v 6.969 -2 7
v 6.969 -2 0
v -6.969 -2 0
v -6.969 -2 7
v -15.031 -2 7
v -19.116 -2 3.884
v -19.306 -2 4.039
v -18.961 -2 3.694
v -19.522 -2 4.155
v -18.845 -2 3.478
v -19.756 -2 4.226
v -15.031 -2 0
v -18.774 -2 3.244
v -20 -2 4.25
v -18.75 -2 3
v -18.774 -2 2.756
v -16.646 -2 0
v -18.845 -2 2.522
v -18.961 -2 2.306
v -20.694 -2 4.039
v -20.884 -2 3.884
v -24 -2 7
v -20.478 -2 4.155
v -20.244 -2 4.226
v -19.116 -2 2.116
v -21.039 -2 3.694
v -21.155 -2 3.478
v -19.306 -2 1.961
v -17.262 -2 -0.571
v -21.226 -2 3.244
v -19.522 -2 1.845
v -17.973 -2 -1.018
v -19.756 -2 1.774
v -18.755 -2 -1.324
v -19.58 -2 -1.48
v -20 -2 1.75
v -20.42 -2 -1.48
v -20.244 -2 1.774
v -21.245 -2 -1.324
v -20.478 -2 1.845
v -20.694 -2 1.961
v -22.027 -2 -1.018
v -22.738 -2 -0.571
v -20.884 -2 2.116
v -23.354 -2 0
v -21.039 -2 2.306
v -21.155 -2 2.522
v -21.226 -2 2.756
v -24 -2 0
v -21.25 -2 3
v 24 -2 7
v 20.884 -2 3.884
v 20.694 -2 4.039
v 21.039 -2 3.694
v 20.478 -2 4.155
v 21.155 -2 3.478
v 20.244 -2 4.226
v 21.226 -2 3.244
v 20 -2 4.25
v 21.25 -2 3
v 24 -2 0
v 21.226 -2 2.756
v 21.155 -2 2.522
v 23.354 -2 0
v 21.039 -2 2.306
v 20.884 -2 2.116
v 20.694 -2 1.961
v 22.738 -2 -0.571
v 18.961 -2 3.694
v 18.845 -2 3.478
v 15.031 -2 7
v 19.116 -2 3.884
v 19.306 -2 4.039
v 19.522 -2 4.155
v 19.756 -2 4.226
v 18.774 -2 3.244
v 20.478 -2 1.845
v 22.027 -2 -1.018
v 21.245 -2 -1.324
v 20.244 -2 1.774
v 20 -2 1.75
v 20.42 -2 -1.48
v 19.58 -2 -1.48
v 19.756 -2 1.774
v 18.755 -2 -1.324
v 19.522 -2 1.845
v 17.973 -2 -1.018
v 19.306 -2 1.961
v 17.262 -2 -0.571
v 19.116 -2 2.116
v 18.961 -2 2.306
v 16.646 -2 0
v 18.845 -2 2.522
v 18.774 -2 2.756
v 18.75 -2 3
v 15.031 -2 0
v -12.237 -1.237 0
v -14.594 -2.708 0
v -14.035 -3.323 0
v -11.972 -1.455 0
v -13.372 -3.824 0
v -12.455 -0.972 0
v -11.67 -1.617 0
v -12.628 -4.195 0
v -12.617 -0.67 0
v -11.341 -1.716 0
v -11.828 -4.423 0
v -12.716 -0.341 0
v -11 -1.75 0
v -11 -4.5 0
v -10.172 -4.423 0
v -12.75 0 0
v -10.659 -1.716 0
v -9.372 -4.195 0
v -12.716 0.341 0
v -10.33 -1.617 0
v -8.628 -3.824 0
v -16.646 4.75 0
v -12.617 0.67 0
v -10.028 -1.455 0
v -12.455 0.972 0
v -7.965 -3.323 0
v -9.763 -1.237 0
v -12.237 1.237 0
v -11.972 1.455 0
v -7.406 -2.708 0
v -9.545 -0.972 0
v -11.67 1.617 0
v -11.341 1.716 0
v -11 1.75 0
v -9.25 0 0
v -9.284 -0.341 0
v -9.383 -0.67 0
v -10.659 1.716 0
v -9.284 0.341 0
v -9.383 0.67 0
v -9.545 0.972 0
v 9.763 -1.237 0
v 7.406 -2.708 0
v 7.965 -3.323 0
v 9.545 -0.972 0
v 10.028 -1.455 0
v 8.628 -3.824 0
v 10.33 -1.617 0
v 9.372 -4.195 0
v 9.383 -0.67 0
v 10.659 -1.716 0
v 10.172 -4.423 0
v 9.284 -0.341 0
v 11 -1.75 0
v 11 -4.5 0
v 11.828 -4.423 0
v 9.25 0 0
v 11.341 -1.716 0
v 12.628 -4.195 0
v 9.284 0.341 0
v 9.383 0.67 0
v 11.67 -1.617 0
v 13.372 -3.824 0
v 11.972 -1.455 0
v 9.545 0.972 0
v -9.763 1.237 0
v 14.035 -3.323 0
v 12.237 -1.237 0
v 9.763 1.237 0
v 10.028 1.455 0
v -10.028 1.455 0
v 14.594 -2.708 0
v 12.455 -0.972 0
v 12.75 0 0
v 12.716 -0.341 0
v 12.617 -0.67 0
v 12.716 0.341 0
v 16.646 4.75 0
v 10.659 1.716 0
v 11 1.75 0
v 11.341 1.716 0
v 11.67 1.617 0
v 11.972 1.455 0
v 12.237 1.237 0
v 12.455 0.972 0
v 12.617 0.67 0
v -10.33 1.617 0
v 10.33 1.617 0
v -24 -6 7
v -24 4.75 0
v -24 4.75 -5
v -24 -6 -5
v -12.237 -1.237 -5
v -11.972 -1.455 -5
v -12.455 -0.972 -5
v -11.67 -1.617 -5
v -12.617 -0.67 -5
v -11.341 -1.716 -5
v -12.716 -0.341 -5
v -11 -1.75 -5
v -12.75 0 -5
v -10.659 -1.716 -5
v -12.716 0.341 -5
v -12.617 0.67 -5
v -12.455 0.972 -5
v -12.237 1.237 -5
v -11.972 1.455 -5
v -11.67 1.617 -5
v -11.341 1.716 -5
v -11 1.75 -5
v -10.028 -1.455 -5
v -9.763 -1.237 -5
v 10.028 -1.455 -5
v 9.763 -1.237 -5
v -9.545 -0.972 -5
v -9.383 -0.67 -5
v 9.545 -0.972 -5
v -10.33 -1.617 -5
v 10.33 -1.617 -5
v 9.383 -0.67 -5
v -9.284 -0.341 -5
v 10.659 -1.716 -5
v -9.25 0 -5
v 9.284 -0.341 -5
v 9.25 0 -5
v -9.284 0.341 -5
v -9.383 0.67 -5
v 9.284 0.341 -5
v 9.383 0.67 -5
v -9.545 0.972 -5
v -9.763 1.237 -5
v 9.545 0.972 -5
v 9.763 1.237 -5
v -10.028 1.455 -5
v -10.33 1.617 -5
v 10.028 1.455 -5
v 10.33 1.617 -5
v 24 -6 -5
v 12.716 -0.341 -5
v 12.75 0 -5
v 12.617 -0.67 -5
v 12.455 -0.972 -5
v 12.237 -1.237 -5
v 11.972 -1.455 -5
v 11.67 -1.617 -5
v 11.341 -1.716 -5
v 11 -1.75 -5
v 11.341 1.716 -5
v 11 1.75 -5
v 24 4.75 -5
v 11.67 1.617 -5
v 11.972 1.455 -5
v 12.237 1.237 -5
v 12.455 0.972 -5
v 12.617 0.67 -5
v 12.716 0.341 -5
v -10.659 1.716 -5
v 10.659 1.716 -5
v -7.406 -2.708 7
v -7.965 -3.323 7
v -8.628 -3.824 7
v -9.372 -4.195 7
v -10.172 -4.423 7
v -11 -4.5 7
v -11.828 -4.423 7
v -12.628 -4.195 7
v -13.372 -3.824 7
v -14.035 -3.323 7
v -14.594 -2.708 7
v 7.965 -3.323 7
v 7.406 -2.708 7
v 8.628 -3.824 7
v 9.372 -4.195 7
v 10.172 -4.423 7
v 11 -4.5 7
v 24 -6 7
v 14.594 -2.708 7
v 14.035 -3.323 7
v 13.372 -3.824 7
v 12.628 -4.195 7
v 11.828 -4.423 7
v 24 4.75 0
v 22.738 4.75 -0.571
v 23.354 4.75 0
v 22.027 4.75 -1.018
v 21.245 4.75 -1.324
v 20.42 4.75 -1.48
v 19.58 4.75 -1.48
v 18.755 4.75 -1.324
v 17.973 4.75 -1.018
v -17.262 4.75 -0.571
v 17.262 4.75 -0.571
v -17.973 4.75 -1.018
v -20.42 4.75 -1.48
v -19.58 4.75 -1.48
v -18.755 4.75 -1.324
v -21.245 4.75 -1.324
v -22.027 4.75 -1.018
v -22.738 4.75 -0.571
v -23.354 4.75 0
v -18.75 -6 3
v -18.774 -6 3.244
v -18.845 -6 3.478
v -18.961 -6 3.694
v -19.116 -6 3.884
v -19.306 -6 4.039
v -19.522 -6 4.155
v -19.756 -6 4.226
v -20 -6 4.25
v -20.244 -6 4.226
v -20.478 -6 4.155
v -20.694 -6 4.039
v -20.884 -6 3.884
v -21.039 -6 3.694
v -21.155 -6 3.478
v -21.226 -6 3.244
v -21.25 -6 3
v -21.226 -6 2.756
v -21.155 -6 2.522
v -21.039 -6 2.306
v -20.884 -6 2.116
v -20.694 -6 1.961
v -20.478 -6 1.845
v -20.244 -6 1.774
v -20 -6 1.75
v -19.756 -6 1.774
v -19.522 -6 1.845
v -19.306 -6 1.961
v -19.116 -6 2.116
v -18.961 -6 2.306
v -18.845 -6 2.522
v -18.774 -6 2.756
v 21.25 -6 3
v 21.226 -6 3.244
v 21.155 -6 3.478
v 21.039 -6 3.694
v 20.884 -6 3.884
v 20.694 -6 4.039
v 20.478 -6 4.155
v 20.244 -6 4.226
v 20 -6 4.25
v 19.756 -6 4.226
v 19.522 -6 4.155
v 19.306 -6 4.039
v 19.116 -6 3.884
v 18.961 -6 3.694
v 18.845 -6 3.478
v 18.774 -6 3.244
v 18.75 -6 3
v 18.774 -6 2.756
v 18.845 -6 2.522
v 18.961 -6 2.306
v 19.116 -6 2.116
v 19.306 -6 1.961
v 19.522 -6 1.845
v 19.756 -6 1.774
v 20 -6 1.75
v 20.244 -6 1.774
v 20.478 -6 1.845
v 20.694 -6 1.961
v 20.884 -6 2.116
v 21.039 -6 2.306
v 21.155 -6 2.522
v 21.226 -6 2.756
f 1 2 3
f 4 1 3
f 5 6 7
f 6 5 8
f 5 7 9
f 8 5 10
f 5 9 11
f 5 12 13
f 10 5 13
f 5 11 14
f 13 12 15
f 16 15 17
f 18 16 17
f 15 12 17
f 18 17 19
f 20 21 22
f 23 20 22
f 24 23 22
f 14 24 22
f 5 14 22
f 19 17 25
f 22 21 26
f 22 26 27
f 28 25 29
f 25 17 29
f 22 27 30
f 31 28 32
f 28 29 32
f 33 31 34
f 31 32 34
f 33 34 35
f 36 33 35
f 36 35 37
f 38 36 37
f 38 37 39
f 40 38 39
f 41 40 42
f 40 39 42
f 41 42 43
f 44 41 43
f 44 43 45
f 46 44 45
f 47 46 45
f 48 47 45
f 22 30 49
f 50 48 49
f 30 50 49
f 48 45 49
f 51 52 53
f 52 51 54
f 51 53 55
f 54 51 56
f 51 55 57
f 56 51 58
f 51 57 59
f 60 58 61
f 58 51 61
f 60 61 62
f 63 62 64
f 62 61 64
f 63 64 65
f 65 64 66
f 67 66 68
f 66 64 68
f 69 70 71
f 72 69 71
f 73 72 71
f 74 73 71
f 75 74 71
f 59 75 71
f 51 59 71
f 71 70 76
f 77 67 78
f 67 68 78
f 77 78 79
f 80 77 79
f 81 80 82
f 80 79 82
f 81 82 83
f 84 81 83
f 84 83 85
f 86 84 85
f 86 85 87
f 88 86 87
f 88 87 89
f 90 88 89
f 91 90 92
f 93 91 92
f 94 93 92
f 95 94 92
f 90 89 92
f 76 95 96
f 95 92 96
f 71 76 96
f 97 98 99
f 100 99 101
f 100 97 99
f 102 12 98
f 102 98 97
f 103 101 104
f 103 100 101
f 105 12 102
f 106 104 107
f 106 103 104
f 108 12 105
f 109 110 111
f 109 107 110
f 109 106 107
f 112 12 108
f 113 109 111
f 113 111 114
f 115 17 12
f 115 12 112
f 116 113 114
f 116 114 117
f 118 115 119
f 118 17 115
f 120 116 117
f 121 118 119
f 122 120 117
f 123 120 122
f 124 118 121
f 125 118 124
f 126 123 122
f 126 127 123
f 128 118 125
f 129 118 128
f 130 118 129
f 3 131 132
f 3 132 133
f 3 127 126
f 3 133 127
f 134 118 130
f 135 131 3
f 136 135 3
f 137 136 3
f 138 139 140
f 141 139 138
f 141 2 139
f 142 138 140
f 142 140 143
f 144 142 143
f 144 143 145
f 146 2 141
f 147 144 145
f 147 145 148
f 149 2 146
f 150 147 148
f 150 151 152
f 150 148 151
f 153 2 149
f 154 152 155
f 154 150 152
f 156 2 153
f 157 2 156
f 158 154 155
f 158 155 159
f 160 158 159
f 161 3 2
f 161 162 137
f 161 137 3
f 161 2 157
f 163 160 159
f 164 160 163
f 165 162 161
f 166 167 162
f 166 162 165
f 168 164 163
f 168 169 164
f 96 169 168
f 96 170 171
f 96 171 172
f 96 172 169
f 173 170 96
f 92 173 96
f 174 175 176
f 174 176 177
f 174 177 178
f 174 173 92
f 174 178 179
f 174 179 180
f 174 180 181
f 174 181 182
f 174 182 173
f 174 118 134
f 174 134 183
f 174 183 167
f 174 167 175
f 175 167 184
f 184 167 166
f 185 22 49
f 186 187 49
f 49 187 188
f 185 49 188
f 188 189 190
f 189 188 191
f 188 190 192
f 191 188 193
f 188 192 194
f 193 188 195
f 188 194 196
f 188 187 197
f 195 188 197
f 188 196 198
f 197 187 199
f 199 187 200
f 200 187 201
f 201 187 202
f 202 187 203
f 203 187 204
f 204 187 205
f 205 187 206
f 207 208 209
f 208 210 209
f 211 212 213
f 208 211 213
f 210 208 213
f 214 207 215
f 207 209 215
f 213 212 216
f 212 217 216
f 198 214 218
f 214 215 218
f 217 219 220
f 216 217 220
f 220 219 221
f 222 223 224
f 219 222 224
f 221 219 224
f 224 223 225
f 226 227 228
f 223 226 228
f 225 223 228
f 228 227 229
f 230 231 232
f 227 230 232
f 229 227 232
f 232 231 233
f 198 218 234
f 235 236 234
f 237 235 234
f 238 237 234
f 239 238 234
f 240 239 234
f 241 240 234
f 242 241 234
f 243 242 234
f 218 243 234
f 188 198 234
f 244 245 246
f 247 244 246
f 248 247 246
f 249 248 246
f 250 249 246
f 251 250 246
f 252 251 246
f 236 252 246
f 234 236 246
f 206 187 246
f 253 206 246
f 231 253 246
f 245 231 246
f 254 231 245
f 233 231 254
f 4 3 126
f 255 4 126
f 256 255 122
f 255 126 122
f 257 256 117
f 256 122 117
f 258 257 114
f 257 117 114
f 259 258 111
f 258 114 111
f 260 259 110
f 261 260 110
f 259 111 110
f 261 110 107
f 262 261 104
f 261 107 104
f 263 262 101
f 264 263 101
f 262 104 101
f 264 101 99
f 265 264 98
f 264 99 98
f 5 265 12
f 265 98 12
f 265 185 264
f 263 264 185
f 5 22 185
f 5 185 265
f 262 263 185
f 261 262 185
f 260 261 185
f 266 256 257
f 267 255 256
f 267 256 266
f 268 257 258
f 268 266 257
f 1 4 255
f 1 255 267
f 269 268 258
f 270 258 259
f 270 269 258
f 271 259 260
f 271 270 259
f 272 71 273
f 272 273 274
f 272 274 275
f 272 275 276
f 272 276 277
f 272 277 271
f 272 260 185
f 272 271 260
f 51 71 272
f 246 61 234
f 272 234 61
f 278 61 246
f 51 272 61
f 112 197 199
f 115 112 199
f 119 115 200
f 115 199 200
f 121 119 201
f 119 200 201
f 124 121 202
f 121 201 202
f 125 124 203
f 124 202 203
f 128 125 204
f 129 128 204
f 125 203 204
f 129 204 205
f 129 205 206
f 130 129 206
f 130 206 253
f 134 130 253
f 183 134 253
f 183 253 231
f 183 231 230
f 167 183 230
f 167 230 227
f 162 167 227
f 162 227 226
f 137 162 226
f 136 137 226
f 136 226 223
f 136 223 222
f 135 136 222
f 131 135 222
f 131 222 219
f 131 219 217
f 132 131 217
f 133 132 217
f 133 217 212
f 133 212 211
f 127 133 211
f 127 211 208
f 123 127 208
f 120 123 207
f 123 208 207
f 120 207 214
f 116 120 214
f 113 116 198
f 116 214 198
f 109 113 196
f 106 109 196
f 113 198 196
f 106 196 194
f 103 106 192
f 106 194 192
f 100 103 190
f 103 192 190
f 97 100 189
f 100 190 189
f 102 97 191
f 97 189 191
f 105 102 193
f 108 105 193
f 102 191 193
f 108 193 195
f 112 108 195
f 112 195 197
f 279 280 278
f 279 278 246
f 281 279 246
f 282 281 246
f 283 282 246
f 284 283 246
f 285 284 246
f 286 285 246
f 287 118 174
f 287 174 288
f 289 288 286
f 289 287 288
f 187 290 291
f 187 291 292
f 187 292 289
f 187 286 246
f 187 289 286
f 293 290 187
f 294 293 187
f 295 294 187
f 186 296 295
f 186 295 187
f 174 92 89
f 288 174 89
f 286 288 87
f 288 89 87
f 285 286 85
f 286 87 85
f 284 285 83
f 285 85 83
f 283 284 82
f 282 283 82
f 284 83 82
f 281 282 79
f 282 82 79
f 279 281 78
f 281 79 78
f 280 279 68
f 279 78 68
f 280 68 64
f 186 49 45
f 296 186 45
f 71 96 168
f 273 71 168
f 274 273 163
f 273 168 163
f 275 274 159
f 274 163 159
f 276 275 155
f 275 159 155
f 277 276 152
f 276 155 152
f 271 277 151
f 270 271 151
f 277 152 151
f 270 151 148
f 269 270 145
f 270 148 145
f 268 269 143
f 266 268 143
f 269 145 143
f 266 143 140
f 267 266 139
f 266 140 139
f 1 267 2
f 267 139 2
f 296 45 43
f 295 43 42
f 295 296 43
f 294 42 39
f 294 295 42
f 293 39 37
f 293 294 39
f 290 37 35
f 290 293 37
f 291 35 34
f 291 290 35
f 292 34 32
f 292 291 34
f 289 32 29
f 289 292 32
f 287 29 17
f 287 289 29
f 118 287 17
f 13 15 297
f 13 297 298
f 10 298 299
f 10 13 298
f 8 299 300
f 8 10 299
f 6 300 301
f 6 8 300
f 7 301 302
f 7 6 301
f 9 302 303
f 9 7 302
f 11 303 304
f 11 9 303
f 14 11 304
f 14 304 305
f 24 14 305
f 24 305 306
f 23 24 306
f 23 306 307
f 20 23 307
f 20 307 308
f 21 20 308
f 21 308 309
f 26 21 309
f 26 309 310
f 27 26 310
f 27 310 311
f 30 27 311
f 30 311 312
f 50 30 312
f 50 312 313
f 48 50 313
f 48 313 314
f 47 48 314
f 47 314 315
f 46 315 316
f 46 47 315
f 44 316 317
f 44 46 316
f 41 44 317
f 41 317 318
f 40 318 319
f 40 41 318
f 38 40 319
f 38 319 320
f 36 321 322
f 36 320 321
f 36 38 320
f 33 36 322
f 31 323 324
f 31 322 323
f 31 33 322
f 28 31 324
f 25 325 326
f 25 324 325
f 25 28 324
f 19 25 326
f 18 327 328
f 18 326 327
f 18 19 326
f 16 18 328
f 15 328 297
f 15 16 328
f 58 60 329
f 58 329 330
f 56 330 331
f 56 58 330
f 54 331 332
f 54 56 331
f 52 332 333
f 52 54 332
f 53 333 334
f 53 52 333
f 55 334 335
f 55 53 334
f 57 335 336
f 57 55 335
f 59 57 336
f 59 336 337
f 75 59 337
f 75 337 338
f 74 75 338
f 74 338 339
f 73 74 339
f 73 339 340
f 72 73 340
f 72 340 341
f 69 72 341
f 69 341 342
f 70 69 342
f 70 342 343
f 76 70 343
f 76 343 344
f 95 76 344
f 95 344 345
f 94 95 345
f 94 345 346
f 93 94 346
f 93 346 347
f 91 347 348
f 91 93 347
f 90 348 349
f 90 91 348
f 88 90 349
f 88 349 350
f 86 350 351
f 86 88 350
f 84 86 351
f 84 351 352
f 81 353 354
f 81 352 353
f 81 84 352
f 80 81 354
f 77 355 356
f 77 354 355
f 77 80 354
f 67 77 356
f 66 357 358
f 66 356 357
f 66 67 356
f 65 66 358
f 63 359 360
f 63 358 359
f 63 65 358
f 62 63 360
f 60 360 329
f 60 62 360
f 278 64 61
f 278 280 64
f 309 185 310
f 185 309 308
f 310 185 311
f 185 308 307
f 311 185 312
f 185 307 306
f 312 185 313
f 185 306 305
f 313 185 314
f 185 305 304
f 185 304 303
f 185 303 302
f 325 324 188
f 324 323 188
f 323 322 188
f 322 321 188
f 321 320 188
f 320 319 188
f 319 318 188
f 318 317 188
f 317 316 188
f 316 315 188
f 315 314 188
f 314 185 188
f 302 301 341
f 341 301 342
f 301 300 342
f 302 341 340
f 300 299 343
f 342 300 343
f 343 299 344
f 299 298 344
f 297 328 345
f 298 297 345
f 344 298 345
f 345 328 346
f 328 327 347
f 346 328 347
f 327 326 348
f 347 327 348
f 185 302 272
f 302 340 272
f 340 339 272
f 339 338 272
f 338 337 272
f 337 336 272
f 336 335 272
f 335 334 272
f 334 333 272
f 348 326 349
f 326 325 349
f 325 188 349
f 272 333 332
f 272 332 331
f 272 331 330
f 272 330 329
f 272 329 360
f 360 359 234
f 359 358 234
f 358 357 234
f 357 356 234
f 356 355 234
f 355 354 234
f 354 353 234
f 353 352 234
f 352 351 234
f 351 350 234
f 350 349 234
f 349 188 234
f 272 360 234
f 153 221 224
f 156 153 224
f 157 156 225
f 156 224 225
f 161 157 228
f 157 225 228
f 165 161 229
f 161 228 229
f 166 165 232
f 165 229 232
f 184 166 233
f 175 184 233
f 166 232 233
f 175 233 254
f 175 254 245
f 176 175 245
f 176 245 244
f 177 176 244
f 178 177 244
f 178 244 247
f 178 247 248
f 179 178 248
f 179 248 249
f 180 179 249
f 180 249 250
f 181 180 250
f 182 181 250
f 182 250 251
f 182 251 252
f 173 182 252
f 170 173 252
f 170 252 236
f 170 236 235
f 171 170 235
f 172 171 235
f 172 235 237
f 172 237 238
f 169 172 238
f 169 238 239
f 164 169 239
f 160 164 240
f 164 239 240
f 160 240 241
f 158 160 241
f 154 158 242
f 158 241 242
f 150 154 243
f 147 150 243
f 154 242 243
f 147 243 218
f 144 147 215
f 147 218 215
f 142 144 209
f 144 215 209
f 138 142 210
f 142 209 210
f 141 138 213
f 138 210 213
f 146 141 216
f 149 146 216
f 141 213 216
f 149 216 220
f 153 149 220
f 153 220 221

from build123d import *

# Parameters (mm, degrees)
F2_DEPTH      = 5
F3_DEPTH      = 7
F4_D          = 3.5
F4_DEPTH      = 10
F4_TIP        = 1.0515060833
F5_R          = 4.5
F5_R_2        = 1.25
F6_DEPTH      = 6.4
F6_DEPTH_BACK = 2
F7_DEPTH      = 25


with BuildPart() as f2:
    # F1 (on Top) → F2 (new body)
    with BuildSketch(Plane.XY):
        with BuildLine():
            Line((24, 4.75), (-24, 4.75))
            Line((-24, 4.75), (-24, -2))
            Line((-24, -2), (-15.0311288741, -2))
            ThreePointArc((-15.0311288741, -2), (-12.0271124735, 4.3812144397), (-6.5, 0))
            ThreePointArc((-6.5, 0), (-6.6187855603, -1.0271124735), (-6.9688711259, -2))
            Line((-6.9688711259, -2), (6.9688711259, -2))
            ThreePointArc((6.9688711259, -2), (9.9728875265, 4.3812144397), (15.5, 0))
            ThreePointArc((15.5, 0), (15.3812144397, -1.0271124735), (15.0311288741, -2))
            Line((15.0311288741, -2), (24, -2))
            Line((24, -2), (24, 4.75))
        make_face()
        with BuildLine():
            ThreePointArc((-6.5, 0), (-12.0271124735, 4.3812144397), (-15.0311288741, -2))
            Line((-15.0311288741, -2), (-6.9688711259, -2))
            ThreePointArc((-6.9688711259, -2), (-6.6187855603, -1.0271124735), (-6.5, 0))
        make_face()
        with BuildLine():
            Line((-15.0311288741, -2), (-24, -2))
            Line((-24, -2), (-24, -6))
            Line((-24, -6), (24, -6))
            Line((24, -6), (24, -2))
            Line((24, -2), (15.0311288741, -2))
            ThreePointArc((15.0311288741, -2), (11, -4.5), (6.9688711259, -2))
            Line((6.9688711259, -2), (-6.9688711259, -2))
            ThreePointArc((-6.9688711259, -2), (-11, -4.5), (-15.0311288741, -2))
        make_face()
        with BuildLine():
            Line((-6.9688711259, -2), (-15.0311288741, -2))
            ThreePointArc((-15.0311288741, -2), (-11, -4.5), (-6.9688711259, -2))
        make_face()
        with BuildLine():
            ThreePointArc((6.9688711259, -2), (11, -4.5), (15.0311288741, -2))
            Line((15.0311288741, -2), (6.9688711259, -2))
        make_face()
        with BuildLine():
            Line((6.9688711259, -2), (15.0311288741, -2))
            ThreePointArc((15.0311288741, -2), (15.3812144397, -1.0271124735), (15.5, 0))
            ThreePointArc((15.5, 0), (9.9728875265, 4.3812144397), (6.9688711259, -2))
        make_face()
    extrude(amount=-F2_DEPTH)

    # F1 (on Top) → F3 (join)
    with BuildSketch(Plane.XY):
        with BuildLine():
            Line((-15.0311288741, -2), (-24, -2))
            Line((-24, -2), (-24, -6))
            Line((-24, -6), (24, -6))
            Line((24, -6), (24, -2))
            Line((24, -2), (15.0311288741, -2))
            ThreePointArc((15.0311288741, -2), (11, -4.5), (6.9688711259, -2))
            Line((6.9688711259, -2), (-6.9688711259, -2))
            ThreePointArc((-6.9688711259, -2), (-11, -4.5), (-15.0311288741, -2))
        make_face()
    extrude(amount=F3_DEPTH)

    # F4
    with Locations(Plane.XY):
        with Locations((-11, 0), (11, 0)):
            Hole(F4_D / 2, depth=F4_DEPTH)
            with Locations((0, 0, -(F4_DEPTH + F4_TIP / 2))):  # 118° drill point
                Cone(0, F4_D / 2, F4_TIP, mode=Mode.SUBTRACT)

    # F5 (on Front) → F6 (cut, two sides)
    with BuildSketch(Plane.XZ) as f6_sk:
        with Locations((20, 3)):
            Circle(F5_R)
        with Locations((20, 3)):
            Circle(F5_R_2, mode=Mode.SUBTRACT)
        with Locations((-20, 3)):
            Circle(F5_R)
        with Locations((-20, 3)):
            Circle(F5_R_2, mode=Mode.SUBTRACT)
    extrude(amount=-F6_DEPTH, mode=Mode.SUBTRACT)
    extrude(f6_sk.sketch, amount=F6_DEPTH_BACK, mode=Mode.SUBTRACT)

    # F5 (on Front) → F7 (cut)
    with BuildSketch(Plane.XZ):
        with Locations((-20, 3)):
            Circle(F5_R_2)
        with Locations((20, 3)):
            Circle(F5_R_2)
    extrude(amount=F7_DEPTH, mode=Mode.SUBTRACT)


solid = f2.part
